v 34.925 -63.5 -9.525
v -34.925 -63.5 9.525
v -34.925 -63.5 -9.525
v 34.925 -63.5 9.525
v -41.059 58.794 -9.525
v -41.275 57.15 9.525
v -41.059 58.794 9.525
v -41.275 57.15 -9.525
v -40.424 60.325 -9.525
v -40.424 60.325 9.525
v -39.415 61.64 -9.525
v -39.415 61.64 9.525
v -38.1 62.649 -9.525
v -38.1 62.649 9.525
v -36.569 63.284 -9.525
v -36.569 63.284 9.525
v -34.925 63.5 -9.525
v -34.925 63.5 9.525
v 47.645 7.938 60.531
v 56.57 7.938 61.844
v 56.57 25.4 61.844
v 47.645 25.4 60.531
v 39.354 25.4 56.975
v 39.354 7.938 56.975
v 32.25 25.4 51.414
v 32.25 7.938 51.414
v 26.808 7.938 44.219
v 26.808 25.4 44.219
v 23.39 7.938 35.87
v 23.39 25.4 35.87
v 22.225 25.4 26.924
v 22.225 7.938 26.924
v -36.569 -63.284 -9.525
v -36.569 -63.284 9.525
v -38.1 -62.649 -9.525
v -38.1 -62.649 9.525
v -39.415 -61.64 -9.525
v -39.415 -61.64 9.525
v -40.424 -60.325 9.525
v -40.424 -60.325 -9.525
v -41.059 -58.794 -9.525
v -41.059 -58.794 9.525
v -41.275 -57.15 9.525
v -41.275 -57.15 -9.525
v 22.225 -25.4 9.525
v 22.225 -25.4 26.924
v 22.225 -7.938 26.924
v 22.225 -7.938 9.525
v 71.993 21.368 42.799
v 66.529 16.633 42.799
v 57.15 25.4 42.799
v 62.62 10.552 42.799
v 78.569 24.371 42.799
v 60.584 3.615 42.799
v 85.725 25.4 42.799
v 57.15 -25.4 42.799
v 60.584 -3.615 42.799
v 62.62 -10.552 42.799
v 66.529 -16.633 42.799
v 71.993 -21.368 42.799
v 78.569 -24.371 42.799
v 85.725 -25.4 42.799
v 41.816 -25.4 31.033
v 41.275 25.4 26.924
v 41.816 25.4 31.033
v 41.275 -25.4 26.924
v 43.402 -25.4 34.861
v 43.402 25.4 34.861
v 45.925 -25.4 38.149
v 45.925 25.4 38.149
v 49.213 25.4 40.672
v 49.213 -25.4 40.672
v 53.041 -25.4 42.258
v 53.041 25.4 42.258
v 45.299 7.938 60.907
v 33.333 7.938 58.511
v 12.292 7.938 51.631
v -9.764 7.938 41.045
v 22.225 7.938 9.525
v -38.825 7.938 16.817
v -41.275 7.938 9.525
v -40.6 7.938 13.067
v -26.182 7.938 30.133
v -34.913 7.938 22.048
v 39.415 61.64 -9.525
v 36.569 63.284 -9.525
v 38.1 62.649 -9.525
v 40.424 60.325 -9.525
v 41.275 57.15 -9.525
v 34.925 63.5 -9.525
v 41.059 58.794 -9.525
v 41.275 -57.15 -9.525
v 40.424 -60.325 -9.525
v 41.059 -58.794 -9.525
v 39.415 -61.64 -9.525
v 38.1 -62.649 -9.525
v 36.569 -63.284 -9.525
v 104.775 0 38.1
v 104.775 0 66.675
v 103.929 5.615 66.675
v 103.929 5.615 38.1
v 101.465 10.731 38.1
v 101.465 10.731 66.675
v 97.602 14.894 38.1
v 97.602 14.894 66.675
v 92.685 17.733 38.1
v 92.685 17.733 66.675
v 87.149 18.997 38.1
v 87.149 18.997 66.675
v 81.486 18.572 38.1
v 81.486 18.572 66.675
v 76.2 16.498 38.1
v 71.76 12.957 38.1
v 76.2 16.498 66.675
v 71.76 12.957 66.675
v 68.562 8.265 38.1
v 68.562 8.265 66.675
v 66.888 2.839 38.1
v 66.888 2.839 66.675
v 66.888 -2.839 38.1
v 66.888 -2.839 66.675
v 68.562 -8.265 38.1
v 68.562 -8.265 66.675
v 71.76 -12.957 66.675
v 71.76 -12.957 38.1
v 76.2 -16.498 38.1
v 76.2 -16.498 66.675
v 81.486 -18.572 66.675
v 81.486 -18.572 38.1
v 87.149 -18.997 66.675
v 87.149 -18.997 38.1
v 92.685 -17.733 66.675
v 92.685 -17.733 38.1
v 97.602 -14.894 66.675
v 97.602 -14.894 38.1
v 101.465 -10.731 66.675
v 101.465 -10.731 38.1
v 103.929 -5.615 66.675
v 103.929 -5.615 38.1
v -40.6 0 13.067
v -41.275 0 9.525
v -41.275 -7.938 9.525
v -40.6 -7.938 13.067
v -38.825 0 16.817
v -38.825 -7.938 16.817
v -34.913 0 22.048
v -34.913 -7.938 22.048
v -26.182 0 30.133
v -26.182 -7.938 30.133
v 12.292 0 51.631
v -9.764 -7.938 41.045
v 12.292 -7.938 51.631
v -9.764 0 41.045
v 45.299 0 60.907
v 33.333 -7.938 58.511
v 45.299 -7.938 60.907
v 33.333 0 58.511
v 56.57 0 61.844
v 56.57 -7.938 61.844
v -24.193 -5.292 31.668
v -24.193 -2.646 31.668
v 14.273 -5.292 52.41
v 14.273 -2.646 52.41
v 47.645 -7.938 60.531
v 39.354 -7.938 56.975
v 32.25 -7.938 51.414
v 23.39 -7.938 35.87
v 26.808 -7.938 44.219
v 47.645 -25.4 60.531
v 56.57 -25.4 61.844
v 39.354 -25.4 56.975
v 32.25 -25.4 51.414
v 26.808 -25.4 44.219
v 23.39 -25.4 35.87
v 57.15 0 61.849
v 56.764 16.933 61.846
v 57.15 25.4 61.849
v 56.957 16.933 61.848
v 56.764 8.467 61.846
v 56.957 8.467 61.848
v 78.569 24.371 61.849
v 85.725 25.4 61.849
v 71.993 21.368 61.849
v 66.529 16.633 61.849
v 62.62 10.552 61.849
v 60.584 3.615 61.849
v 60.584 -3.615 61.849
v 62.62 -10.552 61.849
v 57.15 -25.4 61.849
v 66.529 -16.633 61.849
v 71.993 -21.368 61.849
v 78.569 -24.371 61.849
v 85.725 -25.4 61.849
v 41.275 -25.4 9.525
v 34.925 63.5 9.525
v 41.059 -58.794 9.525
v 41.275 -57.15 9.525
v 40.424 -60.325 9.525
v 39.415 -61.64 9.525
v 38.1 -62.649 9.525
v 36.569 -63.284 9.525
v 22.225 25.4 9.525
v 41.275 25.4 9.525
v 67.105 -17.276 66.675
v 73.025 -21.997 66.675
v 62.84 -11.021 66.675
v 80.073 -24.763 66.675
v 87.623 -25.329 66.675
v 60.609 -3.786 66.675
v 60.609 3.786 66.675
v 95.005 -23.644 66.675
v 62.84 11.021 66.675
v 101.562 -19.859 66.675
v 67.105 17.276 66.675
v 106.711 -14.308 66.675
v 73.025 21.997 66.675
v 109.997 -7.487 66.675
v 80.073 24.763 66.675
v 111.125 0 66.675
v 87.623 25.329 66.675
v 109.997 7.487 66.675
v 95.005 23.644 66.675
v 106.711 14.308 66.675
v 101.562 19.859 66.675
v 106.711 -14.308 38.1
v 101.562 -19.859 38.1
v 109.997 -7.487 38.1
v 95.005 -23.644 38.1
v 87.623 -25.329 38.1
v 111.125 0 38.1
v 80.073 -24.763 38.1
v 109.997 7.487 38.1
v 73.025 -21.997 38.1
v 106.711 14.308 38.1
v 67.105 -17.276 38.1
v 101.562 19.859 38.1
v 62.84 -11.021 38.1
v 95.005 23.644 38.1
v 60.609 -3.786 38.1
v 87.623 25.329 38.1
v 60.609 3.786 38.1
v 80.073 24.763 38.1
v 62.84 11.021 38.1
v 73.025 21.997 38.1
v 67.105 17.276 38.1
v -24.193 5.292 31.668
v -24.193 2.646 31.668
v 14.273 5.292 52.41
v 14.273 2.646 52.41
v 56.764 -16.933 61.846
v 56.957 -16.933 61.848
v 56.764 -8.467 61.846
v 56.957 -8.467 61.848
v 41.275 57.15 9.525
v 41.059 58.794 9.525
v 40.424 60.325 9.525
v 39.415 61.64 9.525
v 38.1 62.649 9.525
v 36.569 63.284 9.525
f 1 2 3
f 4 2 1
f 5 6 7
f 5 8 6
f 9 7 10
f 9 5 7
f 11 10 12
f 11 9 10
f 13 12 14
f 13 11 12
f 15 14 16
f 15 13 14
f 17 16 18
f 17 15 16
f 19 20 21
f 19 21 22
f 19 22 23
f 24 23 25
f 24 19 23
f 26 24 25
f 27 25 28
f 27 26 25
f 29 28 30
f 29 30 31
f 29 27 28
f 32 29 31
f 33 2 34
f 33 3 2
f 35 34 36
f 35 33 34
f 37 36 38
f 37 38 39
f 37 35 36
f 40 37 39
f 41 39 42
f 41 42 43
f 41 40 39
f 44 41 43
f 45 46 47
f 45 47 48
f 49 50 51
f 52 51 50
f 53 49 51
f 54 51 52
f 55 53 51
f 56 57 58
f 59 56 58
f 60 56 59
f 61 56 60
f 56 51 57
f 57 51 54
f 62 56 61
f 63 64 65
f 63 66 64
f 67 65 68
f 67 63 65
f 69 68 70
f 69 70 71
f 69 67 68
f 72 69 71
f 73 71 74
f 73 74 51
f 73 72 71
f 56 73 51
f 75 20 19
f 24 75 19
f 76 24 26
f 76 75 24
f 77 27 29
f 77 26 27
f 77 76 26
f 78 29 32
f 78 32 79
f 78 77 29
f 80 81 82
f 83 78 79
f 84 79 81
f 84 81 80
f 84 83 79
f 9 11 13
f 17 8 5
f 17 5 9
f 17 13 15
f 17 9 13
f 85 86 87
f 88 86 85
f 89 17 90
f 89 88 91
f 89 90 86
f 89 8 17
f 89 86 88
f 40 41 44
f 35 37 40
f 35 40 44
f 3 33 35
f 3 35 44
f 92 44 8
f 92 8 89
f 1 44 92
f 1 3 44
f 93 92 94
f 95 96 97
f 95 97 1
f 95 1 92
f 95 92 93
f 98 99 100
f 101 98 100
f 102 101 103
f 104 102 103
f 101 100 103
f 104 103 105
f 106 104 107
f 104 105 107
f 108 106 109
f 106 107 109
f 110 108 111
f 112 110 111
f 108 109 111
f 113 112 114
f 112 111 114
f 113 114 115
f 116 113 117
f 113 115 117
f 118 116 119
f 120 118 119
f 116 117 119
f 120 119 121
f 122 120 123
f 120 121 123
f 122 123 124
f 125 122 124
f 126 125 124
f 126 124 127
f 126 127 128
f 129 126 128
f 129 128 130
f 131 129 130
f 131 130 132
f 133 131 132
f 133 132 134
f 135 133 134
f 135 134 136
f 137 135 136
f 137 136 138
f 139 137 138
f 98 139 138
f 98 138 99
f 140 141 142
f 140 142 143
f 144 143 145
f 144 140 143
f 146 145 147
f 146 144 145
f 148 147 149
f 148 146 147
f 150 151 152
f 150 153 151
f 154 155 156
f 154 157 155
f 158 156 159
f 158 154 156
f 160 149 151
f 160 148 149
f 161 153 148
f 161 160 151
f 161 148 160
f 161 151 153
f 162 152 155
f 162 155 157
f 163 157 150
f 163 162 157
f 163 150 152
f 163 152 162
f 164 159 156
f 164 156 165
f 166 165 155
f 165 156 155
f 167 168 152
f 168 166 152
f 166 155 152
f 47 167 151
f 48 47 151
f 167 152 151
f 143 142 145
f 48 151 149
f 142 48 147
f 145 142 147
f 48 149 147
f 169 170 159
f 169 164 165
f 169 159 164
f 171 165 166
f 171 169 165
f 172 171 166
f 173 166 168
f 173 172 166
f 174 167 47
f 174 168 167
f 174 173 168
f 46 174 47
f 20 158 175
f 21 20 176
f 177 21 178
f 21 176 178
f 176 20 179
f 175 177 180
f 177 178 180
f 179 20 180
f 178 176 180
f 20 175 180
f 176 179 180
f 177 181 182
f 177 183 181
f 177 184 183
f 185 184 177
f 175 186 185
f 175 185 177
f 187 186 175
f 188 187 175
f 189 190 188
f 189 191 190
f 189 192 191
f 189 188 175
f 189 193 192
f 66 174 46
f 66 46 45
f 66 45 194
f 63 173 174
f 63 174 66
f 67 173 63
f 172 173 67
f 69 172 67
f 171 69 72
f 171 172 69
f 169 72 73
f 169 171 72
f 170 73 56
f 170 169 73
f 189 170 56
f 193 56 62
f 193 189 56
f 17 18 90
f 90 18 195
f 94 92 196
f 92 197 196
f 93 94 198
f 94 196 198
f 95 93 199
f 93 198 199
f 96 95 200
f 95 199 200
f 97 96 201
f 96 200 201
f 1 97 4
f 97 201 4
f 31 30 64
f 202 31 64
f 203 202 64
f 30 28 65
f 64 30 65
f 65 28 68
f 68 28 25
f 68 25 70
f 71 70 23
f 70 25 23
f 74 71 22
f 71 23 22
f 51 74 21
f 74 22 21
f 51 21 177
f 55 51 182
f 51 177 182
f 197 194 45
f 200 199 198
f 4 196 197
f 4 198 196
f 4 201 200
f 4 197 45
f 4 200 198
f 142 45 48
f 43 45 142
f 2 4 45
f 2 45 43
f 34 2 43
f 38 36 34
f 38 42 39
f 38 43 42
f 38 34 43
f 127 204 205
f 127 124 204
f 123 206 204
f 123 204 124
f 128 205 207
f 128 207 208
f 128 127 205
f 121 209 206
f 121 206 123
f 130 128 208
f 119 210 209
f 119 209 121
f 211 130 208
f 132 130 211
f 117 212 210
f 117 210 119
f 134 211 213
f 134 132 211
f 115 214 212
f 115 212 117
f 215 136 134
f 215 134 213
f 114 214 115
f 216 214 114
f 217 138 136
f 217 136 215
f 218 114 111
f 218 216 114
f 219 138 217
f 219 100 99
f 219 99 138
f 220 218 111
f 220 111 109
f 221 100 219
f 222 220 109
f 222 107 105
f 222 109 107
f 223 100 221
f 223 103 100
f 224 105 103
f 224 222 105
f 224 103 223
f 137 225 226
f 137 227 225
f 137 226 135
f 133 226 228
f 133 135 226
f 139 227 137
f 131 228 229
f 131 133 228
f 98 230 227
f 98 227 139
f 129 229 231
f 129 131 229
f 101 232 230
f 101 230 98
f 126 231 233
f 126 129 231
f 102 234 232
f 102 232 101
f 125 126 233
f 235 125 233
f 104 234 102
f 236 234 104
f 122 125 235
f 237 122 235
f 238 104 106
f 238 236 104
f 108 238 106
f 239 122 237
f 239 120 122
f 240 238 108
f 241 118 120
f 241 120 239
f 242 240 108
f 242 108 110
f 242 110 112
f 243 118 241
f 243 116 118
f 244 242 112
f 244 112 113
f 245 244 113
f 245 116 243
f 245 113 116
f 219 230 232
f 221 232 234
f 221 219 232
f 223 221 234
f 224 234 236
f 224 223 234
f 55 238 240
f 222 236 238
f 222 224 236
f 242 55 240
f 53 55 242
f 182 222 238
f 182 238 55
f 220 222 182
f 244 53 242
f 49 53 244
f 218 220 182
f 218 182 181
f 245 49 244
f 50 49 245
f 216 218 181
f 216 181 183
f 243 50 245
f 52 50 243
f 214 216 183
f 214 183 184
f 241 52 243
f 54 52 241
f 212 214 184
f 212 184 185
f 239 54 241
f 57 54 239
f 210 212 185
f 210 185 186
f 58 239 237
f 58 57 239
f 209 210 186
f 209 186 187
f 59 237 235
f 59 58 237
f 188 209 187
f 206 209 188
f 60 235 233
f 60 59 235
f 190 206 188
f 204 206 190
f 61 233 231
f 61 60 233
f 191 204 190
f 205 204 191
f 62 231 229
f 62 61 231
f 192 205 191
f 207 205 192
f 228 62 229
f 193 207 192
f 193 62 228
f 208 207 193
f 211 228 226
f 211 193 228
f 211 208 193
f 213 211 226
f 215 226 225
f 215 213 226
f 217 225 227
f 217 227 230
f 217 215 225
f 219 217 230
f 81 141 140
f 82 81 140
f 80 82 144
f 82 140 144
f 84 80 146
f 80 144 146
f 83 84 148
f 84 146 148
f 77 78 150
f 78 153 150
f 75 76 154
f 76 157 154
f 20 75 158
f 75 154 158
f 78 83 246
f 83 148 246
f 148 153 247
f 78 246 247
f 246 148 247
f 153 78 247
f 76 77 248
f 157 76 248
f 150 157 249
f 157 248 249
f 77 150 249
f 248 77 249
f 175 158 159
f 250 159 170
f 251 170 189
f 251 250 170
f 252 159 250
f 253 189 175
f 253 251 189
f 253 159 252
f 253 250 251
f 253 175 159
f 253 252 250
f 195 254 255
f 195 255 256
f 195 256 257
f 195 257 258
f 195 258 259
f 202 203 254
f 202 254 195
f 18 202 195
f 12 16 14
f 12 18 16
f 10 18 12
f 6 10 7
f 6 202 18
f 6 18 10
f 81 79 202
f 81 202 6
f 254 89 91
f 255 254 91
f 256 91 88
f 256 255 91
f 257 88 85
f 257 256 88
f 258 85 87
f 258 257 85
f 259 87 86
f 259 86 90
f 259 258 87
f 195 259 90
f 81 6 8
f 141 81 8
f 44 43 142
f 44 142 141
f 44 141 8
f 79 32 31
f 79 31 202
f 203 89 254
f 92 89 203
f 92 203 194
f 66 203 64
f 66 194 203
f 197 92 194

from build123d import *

# Parameters (mm, degrees)
F1_DEPTH = 63.5
F0_W     = 25.4
F0_H     = 19.05
F2_DEPTH = 25.4
F3_DEPTH = 7.9375
F5_R     = 6.35
F6_R     = 19.05
F7_DEPTH = 76.201


with BuildPart() as f1:
    # F0 (on Front) → F1 (new body, symmetric)
    with BuildSketch(Plane.XZ):
        Polygon((22.225, 9.525), (-41.275, 9.525), (-41.275, -9.525), (41.275, -9.525), (41.275, 9.525), align=None)
    extrude(amount=F1_DEPTH, both=True)

    # F0 (on Front) → F2 (join, symmetric)
    with BuildSketch(Plane.XZ):
        with Locations((73.025, 52.324)):
            Rectangle(F0_W, F0_H)
        with BuildLine():
            Line((22.225, 26.924), (22.225, 9.525))
            Line((22.225, 9.525), (41.275, 9.525))
            Line((41.275, 9.525), (41.275, 26.924))
            ThreePointArc((41.275, 26.924), (45.9246798487, 38.1493201513), (57.15, 42.799))
            Line((57.15, 42.799), (60.325, 42.799))
            Line((60.325, 42.799), (60.325, 61.849))
            Line((60.325, 61.849), (57.15, 61.849))
            add(Edge.make_bspline(
                [(56.5700312236, 61.8441841521), (56.7638831391, 61.8466038705), (56.957209462, 61.8482110704), (57.15, 61.849)],
                knots=[110.90829632, 110.90829632, 110.90829632, 110.90829632, 111.468747194, 111.468747194, 111.468747194, 111.468747194], degree=3))
            ThreePointArc((56.5700312236, 61.8441841521), (32.2500900151, 51.4137959923), (22.225, 26.924))
        make_face()
    extrude(amount=F2_DEPTH, both=True)

    # F0 (on Front) → F3 (join, symmetric)
    with BuildSketch(Plane.XZ):
        with BuildLine():
            add(Edge.make_bspline(
                [(-41.275, 9.525), (-40.7358347138, 29.0675254726), (18.2084429422, 61.3653431795), (56.5700312236, 61.8441841521)],
                knots=[0, 0, 0, 0, 110.90829632, 110.90829632, 110.90829632, 110.90829632], degree=3))
            Line((-41.275, 9.525), (22.225, 9.525))
            Line((22.225, 9.525), (22.225, 26.924))
            ThreePointArc((22.225, 26.924), (32.2500900151, 51.4137959923), (56.5700312236, 61.8441841521))
        make_face()
    extrude(amount=F3_DEPTH, both=True)

    # F0 (on Front) → F4 (revolve)
    with BuildSketch(Plane.XZ):
        Polygon((85.725, 66.675), (85.725, 61.849), (85.725, 42.799), (85.725, 38.1), (111.125, 38.1), (111.125, 66.675), align=None)
    revolve(axis=Axis((85.725, 0, 52.3875), (0, 0, 1)))

    # F5
    f5_edges = [f1.edges().sort_by_distance(p)[0] for p in [
        (41.275, -63.5, 0),
        (-41.275, -63.5, 0),
        (41.275, 63.5, 0),
        (-41.275, 63.5, 0),
    ]]
    fillet(f5_edges, radius=F5_R)

    # F6 (on face) → F7 (cut, through all)
    with BuildSketch(Plane.XY.offset(66.675)):
        with Locations((85.725, 0)):
            Circle(F6_R)
    extrude(amount=-F7_DEPTH, mode=Mode.SUBTRACT)


solid = f1.part
